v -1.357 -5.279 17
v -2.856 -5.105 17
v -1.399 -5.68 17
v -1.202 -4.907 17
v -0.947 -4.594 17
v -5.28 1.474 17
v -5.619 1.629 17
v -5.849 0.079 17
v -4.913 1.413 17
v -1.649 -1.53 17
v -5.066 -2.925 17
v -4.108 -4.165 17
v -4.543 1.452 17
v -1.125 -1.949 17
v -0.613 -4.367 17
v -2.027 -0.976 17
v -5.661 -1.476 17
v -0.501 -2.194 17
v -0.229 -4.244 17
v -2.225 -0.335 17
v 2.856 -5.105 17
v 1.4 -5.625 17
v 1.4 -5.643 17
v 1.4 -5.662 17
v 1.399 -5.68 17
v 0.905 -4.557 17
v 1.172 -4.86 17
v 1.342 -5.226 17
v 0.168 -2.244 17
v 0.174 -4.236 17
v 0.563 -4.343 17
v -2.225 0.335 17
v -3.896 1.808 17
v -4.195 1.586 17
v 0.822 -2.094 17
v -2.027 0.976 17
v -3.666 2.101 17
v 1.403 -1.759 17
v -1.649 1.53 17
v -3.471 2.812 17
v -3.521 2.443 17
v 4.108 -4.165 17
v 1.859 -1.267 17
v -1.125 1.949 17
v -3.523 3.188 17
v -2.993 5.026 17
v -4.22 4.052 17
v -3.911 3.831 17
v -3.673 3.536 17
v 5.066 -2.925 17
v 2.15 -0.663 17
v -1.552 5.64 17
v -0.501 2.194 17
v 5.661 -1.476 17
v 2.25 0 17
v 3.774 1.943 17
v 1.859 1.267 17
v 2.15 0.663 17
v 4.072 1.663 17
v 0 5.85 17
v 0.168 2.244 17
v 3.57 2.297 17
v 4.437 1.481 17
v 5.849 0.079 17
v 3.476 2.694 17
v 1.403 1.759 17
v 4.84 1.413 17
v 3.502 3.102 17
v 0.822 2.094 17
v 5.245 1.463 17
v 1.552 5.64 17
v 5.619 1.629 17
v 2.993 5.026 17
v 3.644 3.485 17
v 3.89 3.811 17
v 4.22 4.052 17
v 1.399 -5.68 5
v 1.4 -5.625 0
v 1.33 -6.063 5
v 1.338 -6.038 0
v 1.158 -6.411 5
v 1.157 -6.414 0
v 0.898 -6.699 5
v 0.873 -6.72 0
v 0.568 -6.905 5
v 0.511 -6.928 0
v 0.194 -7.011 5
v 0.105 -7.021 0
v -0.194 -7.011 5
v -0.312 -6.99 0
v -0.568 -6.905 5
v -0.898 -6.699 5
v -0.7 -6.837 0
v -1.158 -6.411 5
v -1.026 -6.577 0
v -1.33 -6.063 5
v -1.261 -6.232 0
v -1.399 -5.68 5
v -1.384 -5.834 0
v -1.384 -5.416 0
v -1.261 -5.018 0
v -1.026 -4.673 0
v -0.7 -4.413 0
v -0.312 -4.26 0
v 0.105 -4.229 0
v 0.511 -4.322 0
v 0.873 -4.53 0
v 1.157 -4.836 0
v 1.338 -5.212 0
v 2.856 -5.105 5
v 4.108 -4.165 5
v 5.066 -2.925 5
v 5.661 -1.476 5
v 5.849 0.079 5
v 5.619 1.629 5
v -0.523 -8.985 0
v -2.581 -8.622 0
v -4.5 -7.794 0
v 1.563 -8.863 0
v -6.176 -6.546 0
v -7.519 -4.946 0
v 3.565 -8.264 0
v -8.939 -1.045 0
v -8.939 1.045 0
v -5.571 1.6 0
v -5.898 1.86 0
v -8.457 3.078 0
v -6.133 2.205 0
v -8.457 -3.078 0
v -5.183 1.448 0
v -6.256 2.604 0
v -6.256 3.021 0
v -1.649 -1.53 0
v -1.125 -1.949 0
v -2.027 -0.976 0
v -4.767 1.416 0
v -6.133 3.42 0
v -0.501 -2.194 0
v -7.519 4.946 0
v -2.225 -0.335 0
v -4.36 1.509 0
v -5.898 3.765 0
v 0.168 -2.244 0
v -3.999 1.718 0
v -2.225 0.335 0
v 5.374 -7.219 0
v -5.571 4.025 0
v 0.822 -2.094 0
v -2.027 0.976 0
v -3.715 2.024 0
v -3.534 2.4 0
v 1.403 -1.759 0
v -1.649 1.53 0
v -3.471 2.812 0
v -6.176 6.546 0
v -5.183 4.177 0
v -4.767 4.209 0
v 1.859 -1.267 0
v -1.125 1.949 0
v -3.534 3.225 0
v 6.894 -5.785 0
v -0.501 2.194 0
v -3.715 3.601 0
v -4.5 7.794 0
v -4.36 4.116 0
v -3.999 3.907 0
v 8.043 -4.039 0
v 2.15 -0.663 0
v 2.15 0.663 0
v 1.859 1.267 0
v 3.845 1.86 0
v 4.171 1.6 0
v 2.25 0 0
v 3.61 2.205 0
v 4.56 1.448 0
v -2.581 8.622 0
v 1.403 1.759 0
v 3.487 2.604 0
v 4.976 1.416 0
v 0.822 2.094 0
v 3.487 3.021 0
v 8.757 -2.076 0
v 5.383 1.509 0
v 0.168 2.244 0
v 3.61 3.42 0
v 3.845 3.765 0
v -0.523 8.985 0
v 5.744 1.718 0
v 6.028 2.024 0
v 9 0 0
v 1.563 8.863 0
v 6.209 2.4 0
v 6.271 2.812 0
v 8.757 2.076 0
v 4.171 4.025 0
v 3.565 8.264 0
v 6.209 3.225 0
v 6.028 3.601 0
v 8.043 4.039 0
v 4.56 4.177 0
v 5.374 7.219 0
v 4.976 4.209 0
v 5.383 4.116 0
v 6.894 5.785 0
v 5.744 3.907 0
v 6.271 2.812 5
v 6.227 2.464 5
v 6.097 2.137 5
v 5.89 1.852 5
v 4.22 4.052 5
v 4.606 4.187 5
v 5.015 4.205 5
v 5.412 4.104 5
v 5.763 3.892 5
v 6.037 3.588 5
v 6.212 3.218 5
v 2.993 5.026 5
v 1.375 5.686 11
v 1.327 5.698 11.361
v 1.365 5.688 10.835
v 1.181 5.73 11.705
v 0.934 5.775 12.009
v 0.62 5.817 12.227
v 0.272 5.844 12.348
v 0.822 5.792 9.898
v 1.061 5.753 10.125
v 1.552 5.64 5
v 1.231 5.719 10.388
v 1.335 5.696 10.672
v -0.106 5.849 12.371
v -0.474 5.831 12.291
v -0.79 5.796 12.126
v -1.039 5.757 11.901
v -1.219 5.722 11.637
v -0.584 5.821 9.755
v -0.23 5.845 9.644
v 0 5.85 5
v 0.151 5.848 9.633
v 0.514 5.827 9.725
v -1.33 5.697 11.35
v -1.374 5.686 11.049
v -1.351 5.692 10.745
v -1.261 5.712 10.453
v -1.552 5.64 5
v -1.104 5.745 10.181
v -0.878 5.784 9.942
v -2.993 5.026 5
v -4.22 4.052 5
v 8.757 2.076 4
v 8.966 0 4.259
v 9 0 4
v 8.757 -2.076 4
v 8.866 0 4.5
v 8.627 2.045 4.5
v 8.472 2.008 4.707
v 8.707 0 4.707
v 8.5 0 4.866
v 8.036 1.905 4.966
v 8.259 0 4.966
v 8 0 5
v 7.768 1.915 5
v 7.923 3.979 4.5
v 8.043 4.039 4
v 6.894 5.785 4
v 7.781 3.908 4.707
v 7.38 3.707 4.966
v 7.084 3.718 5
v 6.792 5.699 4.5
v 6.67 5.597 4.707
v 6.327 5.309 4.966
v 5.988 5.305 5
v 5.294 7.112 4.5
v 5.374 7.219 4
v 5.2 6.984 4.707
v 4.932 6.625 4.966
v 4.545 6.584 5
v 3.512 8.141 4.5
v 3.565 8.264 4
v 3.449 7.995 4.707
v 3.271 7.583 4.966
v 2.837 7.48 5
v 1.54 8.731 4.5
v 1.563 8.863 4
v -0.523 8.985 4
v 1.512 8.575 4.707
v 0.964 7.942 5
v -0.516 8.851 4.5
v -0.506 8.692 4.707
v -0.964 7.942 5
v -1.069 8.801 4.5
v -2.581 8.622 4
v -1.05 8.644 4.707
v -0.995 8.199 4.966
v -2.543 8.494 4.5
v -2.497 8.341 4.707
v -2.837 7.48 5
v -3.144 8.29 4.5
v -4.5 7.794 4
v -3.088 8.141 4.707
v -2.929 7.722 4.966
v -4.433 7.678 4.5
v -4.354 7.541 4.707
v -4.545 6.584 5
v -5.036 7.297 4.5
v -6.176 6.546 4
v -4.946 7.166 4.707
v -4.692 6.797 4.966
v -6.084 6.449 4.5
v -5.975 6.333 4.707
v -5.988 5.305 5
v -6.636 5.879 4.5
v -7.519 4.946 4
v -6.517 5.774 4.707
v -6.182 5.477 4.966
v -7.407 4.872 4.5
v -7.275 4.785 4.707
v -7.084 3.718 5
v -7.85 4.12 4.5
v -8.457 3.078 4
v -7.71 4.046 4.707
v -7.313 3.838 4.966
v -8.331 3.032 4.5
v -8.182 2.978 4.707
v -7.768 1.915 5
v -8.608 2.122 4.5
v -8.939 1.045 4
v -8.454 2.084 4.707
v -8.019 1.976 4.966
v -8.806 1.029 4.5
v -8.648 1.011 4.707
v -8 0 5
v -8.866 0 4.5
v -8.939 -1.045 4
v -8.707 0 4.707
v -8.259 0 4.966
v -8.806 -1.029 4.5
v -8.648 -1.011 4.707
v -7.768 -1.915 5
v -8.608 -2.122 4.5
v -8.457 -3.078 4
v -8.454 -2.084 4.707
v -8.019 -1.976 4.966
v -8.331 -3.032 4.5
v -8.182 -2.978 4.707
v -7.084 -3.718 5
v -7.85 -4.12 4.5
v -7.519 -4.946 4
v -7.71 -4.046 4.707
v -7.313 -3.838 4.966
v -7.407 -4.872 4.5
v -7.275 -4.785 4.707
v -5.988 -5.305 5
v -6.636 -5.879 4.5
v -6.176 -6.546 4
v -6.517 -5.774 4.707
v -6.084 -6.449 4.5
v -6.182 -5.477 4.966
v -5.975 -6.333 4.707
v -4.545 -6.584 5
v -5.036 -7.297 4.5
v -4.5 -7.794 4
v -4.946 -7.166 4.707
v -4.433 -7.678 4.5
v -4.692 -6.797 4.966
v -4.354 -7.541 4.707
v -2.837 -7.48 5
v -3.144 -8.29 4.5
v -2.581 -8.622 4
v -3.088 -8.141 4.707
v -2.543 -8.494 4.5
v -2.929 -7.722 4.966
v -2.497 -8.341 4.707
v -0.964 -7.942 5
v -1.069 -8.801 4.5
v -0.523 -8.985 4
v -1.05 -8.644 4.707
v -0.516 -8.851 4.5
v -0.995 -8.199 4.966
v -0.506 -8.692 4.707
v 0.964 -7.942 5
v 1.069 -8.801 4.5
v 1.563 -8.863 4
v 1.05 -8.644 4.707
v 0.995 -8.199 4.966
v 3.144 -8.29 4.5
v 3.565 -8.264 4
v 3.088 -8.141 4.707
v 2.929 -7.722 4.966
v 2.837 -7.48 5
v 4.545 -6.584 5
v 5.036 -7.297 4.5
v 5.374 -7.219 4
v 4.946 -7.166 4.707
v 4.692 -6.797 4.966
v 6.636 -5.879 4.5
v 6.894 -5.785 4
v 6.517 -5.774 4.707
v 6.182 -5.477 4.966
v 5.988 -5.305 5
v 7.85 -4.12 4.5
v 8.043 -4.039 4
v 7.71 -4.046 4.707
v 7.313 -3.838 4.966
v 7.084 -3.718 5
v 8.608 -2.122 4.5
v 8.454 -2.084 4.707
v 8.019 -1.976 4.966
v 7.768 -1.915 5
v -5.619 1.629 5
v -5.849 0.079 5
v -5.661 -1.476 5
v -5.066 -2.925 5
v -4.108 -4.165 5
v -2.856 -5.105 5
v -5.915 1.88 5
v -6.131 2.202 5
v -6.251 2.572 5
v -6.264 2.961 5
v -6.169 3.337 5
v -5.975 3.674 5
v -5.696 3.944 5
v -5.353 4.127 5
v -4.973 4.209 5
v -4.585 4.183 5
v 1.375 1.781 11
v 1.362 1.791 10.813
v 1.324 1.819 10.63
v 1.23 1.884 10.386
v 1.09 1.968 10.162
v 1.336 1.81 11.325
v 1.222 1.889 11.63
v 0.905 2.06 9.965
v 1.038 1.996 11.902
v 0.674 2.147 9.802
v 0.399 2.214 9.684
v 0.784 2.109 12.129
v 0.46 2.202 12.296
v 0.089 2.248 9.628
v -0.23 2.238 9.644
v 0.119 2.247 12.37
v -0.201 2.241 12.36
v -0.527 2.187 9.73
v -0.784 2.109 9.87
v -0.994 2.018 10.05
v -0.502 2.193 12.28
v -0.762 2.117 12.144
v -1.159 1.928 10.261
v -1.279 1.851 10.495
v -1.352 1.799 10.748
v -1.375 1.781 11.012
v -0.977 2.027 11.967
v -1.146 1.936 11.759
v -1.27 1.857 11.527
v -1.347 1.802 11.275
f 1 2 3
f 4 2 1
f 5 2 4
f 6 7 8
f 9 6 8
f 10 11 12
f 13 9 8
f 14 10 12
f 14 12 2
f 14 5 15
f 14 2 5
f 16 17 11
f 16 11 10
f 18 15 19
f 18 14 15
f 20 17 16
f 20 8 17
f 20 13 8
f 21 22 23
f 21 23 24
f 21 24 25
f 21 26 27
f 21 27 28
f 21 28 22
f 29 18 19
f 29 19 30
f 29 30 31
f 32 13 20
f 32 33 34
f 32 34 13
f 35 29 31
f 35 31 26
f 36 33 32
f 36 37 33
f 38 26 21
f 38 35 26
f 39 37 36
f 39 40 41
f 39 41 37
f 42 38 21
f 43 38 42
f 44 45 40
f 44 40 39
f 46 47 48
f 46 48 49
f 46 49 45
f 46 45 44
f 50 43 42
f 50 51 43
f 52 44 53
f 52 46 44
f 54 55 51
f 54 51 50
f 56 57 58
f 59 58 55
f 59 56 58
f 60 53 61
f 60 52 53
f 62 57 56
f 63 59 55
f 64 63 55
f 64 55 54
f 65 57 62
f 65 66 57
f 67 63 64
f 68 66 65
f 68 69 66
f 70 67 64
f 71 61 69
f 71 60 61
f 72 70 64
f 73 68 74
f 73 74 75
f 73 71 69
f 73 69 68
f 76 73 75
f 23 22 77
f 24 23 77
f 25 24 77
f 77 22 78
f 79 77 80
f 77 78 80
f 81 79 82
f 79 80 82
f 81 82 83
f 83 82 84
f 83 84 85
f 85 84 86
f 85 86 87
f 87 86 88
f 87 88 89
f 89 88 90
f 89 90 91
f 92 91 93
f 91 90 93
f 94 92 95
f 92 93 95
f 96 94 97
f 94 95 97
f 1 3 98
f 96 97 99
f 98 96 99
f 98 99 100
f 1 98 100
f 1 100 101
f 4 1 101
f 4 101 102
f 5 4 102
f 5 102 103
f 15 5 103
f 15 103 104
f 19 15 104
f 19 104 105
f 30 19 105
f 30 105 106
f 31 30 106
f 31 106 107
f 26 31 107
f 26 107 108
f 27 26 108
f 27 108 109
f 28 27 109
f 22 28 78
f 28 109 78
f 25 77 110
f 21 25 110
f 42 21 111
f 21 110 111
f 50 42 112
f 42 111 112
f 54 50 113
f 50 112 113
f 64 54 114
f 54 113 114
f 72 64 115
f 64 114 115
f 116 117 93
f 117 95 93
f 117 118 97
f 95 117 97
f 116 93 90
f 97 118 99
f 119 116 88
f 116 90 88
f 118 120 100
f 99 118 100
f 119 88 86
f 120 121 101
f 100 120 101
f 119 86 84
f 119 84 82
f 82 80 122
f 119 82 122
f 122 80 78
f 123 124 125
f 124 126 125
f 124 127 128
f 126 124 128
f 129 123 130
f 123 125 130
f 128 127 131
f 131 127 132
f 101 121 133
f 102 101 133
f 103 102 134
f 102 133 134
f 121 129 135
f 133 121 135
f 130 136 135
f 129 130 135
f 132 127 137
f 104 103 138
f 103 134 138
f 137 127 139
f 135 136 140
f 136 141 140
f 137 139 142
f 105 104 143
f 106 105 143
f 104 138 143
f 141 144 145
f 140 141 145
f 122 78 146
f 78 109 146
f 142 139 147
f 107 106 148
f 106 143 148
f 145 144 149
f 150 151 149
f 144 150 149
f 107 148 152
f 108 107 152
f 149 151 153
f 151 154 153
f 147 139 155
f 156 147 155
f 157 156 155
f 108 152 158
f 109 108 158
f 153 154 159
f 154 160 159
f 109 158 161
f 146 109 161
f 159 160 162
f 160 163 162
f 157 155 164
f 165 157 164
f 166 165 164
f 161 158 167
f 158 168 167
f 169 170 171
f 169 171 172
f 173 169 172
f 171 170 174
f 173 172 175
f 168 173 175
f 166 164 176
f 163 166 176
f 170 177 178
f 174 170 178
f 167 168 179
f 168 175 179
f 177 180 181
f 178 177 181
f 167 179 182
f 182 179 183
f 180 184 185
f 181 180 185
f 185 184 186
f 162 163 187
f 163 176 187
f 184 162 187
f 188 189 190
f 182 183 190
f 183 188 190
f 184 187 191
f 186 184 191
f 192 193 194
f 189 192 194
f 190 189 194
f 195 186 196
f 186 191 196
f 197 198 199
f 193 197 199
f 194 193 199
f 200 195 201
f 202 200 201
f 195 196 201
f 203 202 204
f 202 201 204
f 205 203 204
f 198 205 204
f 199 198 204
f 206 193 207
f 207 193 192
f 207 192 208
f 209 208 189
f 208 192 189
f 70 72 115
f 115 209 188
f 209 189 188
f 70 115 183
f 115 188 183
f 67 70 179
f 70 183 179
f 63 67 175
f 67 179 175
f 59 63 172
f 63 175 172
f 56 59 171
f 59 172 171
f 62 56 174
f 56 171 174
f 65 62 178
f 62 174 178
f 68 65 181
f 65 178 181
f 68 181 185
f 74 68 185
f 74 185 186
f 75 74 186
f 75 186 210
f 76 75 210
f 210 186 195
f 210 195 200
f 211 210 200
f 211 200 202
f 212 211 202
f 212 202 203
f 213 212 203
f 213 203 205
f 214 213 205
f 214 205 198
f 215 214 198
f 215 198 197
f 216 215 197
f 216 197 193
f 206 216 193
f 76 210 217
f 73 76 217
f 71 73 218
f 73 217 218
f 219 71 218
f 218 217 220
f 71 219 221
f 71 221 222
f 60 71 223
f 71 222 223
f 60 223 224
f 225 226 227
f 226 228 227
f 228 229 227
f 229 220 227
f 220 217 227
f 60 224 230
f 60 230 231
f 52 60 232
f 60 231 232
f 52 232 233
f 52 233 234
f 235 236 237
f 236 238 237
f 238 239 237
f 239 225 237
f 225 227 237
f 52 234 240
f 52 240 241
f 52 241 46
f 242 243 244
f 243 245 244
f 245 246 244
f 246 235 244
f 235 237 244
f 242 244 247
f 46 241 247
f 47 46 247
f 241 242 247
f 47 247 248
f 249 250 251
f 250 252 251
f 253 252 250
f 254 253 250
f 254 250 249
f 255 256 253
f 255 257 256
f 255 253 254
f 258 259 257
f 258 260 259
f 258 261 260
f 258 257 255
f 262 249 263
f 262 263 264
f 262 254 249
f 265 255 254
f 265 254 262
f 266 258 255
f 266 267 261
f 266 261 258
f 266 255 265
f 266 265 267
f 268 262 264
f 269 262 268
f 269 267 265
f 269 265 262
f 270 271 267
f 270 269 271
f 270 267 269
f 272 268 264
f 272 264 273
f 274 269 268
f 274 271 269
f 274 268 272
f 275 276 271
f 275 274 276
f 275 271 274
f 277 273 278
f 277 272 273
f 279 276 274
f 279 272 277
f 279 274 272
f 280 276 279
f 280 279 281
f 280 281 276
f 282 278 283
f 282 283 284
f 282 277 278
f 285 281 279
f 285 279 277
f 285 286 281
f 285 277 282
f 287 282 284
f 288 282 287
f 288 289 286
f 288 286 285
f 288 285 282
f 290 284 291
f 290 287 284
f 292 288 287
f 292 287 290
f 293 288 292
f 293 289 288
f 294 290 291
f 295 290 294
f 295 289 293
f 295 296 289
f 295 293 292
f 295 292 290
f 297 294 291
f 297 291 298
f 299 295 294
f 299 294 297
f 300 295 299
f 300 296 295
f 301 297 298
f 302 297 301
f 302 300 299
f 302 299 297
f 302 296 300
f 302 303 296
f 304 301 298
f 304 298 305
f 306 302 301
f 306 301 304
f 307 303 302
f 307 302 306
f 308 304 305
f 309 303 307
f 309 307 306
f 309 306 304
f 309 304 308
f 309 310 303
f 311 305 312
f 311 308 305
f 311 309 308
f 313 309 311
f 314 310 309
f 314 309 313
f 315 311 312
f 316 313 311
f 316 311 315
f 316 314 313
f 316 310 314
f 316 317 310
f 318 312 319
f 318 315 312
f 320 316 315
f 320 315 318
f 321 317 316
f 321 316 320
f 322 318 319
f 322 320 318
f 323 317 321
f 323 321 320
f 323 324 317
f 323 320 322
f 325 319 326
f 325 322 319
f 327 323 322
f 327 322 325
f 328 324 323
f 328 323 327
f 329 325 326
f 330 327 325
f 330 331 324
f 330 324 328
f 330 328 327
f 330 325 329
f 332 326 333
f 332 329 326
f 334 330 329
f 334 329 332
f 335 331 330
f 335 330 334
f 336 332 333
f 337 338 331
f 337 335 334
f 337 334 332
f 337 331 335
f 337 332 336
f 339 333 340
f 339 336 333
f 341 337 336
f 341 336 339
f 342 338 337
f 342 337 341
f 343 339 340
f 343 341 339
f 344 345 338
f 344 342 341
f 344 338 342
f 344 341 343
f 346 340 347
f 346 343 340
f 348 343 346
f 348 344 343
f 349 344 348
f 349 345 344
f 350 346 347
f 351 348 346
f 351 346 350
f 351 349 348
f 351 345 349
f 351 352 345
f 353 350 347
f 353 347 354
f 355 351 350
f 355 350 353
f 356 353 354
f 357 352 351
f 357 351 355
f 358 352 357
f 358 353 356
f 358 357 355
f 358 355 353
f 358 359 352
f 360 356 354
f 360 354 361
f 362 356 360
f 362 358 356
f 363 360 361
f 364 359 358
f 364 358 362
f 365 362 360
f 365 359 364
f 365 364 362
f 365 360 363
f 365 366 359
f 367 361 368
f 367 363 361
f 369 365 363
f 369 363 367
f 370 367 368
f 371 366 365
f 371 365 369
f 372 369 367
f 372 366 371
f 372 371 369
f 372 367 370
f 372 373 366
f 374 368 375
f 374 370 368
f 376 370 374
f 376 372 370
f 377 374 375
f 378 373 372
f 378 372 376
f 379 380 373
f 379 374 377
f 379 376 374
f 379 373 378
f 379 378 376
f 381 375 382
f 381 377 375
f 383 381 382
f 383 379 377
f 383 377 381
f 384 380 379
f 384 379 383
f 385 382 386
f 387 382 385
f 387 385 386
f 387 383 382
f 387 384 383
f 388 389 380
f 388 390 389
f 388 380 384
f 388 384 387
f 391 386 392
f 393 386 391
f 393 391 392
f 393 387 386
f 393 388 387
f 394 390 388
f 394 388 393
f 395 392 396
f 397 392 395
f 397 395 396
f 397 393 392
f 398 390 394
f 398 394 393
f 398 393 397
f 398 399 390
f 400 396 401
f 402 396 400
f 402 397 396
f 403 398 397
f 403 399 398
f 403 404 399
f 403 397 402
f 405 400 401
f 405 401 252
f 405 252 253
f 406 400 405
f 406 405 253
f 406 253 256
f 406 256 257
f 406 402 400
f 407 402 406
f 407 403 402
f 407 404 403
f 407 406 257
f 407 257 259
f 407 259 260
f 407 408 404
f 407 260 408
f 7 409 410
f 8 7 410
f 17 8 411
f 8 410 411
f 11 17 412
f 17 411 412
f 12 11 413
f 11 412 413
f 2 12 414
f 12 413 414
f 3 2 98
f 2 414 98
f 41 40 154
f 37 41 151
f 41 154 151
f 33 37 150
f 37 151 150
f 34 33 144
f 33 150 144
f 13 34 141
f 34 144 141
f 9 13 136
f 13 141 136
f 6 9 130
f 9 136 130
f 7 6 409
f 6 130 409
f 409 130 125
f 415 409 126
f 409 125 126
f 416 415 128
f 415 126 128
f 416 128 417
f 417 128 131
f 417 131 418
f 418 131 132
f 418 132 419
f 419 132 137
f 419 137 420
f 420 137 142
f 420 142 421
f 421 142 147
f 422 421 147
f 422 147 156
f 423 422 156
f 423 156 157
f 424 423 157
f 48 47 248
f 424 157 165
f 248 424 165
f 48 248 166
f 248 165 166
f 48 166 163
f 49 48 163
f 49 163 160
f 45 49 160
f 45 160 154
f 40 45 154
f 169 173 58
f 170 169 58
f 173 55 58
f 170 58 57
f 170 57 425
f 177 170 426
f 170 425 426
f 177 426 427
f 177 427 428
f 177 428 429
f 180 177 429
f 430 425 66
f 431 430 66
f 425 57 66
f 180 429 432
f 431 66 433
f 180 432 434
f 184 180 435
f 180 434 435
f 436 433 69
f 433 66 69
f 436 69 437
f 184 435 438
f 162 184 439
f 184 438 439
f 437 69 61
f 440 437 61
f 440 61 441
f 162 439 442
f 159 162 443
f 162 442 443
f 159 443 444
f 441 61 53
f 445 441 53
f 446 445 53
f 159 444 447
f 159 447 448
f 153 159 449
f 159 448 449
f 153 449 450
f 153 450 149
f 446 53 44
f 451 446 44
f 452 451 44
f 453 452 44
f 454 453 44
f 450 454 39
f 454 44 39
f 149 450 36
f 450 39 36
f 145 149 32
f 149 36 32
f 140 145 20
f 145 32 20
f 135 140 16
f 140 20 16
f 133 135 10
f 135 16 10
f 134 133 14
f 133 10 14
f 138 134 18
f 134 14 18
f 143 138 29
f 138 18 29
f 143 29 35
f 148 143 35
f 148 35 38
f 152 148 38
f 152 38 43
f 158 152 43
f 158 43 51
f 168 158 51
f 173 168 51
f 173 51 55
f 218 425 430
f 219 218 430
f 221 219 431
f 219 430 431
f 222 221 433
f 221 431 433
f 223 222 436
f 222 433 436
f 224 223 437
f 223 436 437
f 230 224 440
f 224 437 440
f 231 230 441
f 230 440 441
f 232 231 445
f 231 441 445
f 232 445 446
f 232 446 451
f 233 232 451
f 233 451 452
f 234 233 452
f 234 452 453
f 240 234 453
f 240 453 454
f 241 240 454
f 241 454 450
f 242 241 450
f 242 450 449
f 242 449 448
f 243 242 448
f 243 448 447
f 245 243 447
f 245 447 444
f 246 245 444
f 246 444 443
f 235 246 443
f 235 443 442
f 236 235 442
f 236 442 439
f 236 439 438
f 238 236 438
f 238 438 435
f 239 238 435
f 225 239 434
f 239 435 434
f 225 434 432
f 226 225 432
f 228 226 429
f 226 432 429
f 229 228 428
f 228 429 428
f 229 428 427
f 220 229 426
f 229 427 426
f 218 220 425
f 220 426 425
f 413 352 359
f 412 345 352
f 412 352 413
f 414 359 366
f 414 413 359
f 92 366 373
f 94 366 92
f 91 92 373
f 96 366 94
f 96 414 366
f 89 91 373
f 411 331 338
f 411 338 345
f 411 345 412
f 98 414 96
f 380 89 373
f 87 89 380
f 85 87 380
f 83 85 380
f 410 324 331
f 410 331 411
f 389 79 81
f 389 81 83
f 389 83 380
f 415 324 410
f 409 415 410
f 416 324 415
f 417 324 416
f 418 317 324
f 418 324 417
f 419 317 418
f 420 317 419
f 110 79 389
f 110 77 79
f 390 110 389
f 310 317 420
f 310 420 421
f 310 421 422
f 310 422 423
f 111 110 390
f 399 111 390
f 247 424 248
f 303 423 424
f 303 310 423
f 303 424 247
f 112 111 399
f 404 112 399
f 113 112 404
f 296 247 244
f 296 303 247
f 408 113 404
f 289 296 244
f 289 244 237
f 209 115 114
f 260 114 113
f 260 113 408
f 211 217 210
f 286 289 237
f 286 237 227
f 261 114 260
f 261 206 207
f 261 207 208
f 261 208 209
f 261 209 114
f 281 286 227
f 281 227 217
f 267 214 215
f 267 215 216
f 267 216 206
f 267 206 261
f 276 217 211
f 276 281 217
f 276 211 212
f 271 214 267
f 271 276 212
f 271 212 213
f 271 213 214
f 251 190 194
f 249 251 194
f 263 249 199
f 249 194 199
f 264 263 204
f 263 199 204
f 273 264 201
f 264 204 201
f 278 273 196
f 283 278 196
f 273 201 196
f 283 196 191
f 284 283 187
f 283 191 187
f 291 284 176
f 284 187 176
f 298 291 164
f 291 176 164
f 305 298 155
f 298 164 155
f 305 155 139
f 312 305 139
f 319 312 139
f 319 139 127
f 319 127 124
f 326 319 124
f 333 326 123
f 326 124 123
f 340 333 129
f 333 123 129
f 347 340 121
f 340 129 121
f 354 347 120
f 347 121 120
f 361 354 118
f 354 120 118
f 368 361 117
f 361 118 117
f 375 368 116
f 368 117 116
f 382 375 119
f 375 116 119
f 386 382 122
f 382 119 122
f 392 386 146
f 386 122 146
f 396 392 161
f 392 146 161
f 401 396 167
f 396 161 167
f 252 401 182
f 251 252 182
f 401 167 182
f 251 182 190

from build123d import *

# Parameters (mm, degrees)
F0_R      = 9
F1_DEPTH  = 5
F2_R      = 5.85
F2_R_2    = 2.25
F3_DEPTH  = 12
F4_R      = 1.375
F5_DEPTH  = 25
F3_FACE_R = 2.25
F6_DEPTH  = 5
F7_R      = 1.4
F8_DEPTH  = 25
F9_R      = 1


with BuildPart() as f1:
    # F0 (on Top) → F1 (new body)
    with BuildSketch(Plane.XY):
        Circle(F0_R)
    extrude(amount=F1_DEPTH)

    # F2 (on face) → F3 (join)
    with BuildSketch(Plane.XY.offset(5)):
        Circle(F2_R)
        Circle(F2_R_2, mode=Mode.SUBTRACT)
    extrude(amount=F3_DEPTH)

    # F4 (on Front) → F5 (cut)
    with BuildSketch(Plane.XZ):
        with Locations((0, 11)):
            Circle(F4_R)
    extrude(amount=-F5_DEPTH, mode=Mode.SUBTRACT)

    # F3_face (on face) → F6 (cut, through all)
    with BuildSketch(Plane.XY.offset(5)):
        Circle(F3_FACE_R)
    extrude(amount=-F6_DEPTH, mode=Mode.SUBTRACT)

    # F7 (on face) → F8 (cut)
    with BuildSketch(Plane(origin=(0, 0, 0), x_dir=(1, 0, 0), z_dir=(0, 0, -1))):
        with Locations((-4.871393, -2.8125)):
            Circle(F7_R)
        with Locations((0, 5.625)):
            Circle(F7_R)
        with Locations((4.871393, -2.8125)):
            Circle(F7_R)
    extrude(amount=-F8_DEPTH, mode=Mode.SUBTRACT)

    # F9
    f9_edges = [f1.edges().sort_by_distance(p)[0] for p in [
        (-9, 0, 5),
    ]]
    fillet(f9_edges, radius=F9_R)


solid = f1.part
